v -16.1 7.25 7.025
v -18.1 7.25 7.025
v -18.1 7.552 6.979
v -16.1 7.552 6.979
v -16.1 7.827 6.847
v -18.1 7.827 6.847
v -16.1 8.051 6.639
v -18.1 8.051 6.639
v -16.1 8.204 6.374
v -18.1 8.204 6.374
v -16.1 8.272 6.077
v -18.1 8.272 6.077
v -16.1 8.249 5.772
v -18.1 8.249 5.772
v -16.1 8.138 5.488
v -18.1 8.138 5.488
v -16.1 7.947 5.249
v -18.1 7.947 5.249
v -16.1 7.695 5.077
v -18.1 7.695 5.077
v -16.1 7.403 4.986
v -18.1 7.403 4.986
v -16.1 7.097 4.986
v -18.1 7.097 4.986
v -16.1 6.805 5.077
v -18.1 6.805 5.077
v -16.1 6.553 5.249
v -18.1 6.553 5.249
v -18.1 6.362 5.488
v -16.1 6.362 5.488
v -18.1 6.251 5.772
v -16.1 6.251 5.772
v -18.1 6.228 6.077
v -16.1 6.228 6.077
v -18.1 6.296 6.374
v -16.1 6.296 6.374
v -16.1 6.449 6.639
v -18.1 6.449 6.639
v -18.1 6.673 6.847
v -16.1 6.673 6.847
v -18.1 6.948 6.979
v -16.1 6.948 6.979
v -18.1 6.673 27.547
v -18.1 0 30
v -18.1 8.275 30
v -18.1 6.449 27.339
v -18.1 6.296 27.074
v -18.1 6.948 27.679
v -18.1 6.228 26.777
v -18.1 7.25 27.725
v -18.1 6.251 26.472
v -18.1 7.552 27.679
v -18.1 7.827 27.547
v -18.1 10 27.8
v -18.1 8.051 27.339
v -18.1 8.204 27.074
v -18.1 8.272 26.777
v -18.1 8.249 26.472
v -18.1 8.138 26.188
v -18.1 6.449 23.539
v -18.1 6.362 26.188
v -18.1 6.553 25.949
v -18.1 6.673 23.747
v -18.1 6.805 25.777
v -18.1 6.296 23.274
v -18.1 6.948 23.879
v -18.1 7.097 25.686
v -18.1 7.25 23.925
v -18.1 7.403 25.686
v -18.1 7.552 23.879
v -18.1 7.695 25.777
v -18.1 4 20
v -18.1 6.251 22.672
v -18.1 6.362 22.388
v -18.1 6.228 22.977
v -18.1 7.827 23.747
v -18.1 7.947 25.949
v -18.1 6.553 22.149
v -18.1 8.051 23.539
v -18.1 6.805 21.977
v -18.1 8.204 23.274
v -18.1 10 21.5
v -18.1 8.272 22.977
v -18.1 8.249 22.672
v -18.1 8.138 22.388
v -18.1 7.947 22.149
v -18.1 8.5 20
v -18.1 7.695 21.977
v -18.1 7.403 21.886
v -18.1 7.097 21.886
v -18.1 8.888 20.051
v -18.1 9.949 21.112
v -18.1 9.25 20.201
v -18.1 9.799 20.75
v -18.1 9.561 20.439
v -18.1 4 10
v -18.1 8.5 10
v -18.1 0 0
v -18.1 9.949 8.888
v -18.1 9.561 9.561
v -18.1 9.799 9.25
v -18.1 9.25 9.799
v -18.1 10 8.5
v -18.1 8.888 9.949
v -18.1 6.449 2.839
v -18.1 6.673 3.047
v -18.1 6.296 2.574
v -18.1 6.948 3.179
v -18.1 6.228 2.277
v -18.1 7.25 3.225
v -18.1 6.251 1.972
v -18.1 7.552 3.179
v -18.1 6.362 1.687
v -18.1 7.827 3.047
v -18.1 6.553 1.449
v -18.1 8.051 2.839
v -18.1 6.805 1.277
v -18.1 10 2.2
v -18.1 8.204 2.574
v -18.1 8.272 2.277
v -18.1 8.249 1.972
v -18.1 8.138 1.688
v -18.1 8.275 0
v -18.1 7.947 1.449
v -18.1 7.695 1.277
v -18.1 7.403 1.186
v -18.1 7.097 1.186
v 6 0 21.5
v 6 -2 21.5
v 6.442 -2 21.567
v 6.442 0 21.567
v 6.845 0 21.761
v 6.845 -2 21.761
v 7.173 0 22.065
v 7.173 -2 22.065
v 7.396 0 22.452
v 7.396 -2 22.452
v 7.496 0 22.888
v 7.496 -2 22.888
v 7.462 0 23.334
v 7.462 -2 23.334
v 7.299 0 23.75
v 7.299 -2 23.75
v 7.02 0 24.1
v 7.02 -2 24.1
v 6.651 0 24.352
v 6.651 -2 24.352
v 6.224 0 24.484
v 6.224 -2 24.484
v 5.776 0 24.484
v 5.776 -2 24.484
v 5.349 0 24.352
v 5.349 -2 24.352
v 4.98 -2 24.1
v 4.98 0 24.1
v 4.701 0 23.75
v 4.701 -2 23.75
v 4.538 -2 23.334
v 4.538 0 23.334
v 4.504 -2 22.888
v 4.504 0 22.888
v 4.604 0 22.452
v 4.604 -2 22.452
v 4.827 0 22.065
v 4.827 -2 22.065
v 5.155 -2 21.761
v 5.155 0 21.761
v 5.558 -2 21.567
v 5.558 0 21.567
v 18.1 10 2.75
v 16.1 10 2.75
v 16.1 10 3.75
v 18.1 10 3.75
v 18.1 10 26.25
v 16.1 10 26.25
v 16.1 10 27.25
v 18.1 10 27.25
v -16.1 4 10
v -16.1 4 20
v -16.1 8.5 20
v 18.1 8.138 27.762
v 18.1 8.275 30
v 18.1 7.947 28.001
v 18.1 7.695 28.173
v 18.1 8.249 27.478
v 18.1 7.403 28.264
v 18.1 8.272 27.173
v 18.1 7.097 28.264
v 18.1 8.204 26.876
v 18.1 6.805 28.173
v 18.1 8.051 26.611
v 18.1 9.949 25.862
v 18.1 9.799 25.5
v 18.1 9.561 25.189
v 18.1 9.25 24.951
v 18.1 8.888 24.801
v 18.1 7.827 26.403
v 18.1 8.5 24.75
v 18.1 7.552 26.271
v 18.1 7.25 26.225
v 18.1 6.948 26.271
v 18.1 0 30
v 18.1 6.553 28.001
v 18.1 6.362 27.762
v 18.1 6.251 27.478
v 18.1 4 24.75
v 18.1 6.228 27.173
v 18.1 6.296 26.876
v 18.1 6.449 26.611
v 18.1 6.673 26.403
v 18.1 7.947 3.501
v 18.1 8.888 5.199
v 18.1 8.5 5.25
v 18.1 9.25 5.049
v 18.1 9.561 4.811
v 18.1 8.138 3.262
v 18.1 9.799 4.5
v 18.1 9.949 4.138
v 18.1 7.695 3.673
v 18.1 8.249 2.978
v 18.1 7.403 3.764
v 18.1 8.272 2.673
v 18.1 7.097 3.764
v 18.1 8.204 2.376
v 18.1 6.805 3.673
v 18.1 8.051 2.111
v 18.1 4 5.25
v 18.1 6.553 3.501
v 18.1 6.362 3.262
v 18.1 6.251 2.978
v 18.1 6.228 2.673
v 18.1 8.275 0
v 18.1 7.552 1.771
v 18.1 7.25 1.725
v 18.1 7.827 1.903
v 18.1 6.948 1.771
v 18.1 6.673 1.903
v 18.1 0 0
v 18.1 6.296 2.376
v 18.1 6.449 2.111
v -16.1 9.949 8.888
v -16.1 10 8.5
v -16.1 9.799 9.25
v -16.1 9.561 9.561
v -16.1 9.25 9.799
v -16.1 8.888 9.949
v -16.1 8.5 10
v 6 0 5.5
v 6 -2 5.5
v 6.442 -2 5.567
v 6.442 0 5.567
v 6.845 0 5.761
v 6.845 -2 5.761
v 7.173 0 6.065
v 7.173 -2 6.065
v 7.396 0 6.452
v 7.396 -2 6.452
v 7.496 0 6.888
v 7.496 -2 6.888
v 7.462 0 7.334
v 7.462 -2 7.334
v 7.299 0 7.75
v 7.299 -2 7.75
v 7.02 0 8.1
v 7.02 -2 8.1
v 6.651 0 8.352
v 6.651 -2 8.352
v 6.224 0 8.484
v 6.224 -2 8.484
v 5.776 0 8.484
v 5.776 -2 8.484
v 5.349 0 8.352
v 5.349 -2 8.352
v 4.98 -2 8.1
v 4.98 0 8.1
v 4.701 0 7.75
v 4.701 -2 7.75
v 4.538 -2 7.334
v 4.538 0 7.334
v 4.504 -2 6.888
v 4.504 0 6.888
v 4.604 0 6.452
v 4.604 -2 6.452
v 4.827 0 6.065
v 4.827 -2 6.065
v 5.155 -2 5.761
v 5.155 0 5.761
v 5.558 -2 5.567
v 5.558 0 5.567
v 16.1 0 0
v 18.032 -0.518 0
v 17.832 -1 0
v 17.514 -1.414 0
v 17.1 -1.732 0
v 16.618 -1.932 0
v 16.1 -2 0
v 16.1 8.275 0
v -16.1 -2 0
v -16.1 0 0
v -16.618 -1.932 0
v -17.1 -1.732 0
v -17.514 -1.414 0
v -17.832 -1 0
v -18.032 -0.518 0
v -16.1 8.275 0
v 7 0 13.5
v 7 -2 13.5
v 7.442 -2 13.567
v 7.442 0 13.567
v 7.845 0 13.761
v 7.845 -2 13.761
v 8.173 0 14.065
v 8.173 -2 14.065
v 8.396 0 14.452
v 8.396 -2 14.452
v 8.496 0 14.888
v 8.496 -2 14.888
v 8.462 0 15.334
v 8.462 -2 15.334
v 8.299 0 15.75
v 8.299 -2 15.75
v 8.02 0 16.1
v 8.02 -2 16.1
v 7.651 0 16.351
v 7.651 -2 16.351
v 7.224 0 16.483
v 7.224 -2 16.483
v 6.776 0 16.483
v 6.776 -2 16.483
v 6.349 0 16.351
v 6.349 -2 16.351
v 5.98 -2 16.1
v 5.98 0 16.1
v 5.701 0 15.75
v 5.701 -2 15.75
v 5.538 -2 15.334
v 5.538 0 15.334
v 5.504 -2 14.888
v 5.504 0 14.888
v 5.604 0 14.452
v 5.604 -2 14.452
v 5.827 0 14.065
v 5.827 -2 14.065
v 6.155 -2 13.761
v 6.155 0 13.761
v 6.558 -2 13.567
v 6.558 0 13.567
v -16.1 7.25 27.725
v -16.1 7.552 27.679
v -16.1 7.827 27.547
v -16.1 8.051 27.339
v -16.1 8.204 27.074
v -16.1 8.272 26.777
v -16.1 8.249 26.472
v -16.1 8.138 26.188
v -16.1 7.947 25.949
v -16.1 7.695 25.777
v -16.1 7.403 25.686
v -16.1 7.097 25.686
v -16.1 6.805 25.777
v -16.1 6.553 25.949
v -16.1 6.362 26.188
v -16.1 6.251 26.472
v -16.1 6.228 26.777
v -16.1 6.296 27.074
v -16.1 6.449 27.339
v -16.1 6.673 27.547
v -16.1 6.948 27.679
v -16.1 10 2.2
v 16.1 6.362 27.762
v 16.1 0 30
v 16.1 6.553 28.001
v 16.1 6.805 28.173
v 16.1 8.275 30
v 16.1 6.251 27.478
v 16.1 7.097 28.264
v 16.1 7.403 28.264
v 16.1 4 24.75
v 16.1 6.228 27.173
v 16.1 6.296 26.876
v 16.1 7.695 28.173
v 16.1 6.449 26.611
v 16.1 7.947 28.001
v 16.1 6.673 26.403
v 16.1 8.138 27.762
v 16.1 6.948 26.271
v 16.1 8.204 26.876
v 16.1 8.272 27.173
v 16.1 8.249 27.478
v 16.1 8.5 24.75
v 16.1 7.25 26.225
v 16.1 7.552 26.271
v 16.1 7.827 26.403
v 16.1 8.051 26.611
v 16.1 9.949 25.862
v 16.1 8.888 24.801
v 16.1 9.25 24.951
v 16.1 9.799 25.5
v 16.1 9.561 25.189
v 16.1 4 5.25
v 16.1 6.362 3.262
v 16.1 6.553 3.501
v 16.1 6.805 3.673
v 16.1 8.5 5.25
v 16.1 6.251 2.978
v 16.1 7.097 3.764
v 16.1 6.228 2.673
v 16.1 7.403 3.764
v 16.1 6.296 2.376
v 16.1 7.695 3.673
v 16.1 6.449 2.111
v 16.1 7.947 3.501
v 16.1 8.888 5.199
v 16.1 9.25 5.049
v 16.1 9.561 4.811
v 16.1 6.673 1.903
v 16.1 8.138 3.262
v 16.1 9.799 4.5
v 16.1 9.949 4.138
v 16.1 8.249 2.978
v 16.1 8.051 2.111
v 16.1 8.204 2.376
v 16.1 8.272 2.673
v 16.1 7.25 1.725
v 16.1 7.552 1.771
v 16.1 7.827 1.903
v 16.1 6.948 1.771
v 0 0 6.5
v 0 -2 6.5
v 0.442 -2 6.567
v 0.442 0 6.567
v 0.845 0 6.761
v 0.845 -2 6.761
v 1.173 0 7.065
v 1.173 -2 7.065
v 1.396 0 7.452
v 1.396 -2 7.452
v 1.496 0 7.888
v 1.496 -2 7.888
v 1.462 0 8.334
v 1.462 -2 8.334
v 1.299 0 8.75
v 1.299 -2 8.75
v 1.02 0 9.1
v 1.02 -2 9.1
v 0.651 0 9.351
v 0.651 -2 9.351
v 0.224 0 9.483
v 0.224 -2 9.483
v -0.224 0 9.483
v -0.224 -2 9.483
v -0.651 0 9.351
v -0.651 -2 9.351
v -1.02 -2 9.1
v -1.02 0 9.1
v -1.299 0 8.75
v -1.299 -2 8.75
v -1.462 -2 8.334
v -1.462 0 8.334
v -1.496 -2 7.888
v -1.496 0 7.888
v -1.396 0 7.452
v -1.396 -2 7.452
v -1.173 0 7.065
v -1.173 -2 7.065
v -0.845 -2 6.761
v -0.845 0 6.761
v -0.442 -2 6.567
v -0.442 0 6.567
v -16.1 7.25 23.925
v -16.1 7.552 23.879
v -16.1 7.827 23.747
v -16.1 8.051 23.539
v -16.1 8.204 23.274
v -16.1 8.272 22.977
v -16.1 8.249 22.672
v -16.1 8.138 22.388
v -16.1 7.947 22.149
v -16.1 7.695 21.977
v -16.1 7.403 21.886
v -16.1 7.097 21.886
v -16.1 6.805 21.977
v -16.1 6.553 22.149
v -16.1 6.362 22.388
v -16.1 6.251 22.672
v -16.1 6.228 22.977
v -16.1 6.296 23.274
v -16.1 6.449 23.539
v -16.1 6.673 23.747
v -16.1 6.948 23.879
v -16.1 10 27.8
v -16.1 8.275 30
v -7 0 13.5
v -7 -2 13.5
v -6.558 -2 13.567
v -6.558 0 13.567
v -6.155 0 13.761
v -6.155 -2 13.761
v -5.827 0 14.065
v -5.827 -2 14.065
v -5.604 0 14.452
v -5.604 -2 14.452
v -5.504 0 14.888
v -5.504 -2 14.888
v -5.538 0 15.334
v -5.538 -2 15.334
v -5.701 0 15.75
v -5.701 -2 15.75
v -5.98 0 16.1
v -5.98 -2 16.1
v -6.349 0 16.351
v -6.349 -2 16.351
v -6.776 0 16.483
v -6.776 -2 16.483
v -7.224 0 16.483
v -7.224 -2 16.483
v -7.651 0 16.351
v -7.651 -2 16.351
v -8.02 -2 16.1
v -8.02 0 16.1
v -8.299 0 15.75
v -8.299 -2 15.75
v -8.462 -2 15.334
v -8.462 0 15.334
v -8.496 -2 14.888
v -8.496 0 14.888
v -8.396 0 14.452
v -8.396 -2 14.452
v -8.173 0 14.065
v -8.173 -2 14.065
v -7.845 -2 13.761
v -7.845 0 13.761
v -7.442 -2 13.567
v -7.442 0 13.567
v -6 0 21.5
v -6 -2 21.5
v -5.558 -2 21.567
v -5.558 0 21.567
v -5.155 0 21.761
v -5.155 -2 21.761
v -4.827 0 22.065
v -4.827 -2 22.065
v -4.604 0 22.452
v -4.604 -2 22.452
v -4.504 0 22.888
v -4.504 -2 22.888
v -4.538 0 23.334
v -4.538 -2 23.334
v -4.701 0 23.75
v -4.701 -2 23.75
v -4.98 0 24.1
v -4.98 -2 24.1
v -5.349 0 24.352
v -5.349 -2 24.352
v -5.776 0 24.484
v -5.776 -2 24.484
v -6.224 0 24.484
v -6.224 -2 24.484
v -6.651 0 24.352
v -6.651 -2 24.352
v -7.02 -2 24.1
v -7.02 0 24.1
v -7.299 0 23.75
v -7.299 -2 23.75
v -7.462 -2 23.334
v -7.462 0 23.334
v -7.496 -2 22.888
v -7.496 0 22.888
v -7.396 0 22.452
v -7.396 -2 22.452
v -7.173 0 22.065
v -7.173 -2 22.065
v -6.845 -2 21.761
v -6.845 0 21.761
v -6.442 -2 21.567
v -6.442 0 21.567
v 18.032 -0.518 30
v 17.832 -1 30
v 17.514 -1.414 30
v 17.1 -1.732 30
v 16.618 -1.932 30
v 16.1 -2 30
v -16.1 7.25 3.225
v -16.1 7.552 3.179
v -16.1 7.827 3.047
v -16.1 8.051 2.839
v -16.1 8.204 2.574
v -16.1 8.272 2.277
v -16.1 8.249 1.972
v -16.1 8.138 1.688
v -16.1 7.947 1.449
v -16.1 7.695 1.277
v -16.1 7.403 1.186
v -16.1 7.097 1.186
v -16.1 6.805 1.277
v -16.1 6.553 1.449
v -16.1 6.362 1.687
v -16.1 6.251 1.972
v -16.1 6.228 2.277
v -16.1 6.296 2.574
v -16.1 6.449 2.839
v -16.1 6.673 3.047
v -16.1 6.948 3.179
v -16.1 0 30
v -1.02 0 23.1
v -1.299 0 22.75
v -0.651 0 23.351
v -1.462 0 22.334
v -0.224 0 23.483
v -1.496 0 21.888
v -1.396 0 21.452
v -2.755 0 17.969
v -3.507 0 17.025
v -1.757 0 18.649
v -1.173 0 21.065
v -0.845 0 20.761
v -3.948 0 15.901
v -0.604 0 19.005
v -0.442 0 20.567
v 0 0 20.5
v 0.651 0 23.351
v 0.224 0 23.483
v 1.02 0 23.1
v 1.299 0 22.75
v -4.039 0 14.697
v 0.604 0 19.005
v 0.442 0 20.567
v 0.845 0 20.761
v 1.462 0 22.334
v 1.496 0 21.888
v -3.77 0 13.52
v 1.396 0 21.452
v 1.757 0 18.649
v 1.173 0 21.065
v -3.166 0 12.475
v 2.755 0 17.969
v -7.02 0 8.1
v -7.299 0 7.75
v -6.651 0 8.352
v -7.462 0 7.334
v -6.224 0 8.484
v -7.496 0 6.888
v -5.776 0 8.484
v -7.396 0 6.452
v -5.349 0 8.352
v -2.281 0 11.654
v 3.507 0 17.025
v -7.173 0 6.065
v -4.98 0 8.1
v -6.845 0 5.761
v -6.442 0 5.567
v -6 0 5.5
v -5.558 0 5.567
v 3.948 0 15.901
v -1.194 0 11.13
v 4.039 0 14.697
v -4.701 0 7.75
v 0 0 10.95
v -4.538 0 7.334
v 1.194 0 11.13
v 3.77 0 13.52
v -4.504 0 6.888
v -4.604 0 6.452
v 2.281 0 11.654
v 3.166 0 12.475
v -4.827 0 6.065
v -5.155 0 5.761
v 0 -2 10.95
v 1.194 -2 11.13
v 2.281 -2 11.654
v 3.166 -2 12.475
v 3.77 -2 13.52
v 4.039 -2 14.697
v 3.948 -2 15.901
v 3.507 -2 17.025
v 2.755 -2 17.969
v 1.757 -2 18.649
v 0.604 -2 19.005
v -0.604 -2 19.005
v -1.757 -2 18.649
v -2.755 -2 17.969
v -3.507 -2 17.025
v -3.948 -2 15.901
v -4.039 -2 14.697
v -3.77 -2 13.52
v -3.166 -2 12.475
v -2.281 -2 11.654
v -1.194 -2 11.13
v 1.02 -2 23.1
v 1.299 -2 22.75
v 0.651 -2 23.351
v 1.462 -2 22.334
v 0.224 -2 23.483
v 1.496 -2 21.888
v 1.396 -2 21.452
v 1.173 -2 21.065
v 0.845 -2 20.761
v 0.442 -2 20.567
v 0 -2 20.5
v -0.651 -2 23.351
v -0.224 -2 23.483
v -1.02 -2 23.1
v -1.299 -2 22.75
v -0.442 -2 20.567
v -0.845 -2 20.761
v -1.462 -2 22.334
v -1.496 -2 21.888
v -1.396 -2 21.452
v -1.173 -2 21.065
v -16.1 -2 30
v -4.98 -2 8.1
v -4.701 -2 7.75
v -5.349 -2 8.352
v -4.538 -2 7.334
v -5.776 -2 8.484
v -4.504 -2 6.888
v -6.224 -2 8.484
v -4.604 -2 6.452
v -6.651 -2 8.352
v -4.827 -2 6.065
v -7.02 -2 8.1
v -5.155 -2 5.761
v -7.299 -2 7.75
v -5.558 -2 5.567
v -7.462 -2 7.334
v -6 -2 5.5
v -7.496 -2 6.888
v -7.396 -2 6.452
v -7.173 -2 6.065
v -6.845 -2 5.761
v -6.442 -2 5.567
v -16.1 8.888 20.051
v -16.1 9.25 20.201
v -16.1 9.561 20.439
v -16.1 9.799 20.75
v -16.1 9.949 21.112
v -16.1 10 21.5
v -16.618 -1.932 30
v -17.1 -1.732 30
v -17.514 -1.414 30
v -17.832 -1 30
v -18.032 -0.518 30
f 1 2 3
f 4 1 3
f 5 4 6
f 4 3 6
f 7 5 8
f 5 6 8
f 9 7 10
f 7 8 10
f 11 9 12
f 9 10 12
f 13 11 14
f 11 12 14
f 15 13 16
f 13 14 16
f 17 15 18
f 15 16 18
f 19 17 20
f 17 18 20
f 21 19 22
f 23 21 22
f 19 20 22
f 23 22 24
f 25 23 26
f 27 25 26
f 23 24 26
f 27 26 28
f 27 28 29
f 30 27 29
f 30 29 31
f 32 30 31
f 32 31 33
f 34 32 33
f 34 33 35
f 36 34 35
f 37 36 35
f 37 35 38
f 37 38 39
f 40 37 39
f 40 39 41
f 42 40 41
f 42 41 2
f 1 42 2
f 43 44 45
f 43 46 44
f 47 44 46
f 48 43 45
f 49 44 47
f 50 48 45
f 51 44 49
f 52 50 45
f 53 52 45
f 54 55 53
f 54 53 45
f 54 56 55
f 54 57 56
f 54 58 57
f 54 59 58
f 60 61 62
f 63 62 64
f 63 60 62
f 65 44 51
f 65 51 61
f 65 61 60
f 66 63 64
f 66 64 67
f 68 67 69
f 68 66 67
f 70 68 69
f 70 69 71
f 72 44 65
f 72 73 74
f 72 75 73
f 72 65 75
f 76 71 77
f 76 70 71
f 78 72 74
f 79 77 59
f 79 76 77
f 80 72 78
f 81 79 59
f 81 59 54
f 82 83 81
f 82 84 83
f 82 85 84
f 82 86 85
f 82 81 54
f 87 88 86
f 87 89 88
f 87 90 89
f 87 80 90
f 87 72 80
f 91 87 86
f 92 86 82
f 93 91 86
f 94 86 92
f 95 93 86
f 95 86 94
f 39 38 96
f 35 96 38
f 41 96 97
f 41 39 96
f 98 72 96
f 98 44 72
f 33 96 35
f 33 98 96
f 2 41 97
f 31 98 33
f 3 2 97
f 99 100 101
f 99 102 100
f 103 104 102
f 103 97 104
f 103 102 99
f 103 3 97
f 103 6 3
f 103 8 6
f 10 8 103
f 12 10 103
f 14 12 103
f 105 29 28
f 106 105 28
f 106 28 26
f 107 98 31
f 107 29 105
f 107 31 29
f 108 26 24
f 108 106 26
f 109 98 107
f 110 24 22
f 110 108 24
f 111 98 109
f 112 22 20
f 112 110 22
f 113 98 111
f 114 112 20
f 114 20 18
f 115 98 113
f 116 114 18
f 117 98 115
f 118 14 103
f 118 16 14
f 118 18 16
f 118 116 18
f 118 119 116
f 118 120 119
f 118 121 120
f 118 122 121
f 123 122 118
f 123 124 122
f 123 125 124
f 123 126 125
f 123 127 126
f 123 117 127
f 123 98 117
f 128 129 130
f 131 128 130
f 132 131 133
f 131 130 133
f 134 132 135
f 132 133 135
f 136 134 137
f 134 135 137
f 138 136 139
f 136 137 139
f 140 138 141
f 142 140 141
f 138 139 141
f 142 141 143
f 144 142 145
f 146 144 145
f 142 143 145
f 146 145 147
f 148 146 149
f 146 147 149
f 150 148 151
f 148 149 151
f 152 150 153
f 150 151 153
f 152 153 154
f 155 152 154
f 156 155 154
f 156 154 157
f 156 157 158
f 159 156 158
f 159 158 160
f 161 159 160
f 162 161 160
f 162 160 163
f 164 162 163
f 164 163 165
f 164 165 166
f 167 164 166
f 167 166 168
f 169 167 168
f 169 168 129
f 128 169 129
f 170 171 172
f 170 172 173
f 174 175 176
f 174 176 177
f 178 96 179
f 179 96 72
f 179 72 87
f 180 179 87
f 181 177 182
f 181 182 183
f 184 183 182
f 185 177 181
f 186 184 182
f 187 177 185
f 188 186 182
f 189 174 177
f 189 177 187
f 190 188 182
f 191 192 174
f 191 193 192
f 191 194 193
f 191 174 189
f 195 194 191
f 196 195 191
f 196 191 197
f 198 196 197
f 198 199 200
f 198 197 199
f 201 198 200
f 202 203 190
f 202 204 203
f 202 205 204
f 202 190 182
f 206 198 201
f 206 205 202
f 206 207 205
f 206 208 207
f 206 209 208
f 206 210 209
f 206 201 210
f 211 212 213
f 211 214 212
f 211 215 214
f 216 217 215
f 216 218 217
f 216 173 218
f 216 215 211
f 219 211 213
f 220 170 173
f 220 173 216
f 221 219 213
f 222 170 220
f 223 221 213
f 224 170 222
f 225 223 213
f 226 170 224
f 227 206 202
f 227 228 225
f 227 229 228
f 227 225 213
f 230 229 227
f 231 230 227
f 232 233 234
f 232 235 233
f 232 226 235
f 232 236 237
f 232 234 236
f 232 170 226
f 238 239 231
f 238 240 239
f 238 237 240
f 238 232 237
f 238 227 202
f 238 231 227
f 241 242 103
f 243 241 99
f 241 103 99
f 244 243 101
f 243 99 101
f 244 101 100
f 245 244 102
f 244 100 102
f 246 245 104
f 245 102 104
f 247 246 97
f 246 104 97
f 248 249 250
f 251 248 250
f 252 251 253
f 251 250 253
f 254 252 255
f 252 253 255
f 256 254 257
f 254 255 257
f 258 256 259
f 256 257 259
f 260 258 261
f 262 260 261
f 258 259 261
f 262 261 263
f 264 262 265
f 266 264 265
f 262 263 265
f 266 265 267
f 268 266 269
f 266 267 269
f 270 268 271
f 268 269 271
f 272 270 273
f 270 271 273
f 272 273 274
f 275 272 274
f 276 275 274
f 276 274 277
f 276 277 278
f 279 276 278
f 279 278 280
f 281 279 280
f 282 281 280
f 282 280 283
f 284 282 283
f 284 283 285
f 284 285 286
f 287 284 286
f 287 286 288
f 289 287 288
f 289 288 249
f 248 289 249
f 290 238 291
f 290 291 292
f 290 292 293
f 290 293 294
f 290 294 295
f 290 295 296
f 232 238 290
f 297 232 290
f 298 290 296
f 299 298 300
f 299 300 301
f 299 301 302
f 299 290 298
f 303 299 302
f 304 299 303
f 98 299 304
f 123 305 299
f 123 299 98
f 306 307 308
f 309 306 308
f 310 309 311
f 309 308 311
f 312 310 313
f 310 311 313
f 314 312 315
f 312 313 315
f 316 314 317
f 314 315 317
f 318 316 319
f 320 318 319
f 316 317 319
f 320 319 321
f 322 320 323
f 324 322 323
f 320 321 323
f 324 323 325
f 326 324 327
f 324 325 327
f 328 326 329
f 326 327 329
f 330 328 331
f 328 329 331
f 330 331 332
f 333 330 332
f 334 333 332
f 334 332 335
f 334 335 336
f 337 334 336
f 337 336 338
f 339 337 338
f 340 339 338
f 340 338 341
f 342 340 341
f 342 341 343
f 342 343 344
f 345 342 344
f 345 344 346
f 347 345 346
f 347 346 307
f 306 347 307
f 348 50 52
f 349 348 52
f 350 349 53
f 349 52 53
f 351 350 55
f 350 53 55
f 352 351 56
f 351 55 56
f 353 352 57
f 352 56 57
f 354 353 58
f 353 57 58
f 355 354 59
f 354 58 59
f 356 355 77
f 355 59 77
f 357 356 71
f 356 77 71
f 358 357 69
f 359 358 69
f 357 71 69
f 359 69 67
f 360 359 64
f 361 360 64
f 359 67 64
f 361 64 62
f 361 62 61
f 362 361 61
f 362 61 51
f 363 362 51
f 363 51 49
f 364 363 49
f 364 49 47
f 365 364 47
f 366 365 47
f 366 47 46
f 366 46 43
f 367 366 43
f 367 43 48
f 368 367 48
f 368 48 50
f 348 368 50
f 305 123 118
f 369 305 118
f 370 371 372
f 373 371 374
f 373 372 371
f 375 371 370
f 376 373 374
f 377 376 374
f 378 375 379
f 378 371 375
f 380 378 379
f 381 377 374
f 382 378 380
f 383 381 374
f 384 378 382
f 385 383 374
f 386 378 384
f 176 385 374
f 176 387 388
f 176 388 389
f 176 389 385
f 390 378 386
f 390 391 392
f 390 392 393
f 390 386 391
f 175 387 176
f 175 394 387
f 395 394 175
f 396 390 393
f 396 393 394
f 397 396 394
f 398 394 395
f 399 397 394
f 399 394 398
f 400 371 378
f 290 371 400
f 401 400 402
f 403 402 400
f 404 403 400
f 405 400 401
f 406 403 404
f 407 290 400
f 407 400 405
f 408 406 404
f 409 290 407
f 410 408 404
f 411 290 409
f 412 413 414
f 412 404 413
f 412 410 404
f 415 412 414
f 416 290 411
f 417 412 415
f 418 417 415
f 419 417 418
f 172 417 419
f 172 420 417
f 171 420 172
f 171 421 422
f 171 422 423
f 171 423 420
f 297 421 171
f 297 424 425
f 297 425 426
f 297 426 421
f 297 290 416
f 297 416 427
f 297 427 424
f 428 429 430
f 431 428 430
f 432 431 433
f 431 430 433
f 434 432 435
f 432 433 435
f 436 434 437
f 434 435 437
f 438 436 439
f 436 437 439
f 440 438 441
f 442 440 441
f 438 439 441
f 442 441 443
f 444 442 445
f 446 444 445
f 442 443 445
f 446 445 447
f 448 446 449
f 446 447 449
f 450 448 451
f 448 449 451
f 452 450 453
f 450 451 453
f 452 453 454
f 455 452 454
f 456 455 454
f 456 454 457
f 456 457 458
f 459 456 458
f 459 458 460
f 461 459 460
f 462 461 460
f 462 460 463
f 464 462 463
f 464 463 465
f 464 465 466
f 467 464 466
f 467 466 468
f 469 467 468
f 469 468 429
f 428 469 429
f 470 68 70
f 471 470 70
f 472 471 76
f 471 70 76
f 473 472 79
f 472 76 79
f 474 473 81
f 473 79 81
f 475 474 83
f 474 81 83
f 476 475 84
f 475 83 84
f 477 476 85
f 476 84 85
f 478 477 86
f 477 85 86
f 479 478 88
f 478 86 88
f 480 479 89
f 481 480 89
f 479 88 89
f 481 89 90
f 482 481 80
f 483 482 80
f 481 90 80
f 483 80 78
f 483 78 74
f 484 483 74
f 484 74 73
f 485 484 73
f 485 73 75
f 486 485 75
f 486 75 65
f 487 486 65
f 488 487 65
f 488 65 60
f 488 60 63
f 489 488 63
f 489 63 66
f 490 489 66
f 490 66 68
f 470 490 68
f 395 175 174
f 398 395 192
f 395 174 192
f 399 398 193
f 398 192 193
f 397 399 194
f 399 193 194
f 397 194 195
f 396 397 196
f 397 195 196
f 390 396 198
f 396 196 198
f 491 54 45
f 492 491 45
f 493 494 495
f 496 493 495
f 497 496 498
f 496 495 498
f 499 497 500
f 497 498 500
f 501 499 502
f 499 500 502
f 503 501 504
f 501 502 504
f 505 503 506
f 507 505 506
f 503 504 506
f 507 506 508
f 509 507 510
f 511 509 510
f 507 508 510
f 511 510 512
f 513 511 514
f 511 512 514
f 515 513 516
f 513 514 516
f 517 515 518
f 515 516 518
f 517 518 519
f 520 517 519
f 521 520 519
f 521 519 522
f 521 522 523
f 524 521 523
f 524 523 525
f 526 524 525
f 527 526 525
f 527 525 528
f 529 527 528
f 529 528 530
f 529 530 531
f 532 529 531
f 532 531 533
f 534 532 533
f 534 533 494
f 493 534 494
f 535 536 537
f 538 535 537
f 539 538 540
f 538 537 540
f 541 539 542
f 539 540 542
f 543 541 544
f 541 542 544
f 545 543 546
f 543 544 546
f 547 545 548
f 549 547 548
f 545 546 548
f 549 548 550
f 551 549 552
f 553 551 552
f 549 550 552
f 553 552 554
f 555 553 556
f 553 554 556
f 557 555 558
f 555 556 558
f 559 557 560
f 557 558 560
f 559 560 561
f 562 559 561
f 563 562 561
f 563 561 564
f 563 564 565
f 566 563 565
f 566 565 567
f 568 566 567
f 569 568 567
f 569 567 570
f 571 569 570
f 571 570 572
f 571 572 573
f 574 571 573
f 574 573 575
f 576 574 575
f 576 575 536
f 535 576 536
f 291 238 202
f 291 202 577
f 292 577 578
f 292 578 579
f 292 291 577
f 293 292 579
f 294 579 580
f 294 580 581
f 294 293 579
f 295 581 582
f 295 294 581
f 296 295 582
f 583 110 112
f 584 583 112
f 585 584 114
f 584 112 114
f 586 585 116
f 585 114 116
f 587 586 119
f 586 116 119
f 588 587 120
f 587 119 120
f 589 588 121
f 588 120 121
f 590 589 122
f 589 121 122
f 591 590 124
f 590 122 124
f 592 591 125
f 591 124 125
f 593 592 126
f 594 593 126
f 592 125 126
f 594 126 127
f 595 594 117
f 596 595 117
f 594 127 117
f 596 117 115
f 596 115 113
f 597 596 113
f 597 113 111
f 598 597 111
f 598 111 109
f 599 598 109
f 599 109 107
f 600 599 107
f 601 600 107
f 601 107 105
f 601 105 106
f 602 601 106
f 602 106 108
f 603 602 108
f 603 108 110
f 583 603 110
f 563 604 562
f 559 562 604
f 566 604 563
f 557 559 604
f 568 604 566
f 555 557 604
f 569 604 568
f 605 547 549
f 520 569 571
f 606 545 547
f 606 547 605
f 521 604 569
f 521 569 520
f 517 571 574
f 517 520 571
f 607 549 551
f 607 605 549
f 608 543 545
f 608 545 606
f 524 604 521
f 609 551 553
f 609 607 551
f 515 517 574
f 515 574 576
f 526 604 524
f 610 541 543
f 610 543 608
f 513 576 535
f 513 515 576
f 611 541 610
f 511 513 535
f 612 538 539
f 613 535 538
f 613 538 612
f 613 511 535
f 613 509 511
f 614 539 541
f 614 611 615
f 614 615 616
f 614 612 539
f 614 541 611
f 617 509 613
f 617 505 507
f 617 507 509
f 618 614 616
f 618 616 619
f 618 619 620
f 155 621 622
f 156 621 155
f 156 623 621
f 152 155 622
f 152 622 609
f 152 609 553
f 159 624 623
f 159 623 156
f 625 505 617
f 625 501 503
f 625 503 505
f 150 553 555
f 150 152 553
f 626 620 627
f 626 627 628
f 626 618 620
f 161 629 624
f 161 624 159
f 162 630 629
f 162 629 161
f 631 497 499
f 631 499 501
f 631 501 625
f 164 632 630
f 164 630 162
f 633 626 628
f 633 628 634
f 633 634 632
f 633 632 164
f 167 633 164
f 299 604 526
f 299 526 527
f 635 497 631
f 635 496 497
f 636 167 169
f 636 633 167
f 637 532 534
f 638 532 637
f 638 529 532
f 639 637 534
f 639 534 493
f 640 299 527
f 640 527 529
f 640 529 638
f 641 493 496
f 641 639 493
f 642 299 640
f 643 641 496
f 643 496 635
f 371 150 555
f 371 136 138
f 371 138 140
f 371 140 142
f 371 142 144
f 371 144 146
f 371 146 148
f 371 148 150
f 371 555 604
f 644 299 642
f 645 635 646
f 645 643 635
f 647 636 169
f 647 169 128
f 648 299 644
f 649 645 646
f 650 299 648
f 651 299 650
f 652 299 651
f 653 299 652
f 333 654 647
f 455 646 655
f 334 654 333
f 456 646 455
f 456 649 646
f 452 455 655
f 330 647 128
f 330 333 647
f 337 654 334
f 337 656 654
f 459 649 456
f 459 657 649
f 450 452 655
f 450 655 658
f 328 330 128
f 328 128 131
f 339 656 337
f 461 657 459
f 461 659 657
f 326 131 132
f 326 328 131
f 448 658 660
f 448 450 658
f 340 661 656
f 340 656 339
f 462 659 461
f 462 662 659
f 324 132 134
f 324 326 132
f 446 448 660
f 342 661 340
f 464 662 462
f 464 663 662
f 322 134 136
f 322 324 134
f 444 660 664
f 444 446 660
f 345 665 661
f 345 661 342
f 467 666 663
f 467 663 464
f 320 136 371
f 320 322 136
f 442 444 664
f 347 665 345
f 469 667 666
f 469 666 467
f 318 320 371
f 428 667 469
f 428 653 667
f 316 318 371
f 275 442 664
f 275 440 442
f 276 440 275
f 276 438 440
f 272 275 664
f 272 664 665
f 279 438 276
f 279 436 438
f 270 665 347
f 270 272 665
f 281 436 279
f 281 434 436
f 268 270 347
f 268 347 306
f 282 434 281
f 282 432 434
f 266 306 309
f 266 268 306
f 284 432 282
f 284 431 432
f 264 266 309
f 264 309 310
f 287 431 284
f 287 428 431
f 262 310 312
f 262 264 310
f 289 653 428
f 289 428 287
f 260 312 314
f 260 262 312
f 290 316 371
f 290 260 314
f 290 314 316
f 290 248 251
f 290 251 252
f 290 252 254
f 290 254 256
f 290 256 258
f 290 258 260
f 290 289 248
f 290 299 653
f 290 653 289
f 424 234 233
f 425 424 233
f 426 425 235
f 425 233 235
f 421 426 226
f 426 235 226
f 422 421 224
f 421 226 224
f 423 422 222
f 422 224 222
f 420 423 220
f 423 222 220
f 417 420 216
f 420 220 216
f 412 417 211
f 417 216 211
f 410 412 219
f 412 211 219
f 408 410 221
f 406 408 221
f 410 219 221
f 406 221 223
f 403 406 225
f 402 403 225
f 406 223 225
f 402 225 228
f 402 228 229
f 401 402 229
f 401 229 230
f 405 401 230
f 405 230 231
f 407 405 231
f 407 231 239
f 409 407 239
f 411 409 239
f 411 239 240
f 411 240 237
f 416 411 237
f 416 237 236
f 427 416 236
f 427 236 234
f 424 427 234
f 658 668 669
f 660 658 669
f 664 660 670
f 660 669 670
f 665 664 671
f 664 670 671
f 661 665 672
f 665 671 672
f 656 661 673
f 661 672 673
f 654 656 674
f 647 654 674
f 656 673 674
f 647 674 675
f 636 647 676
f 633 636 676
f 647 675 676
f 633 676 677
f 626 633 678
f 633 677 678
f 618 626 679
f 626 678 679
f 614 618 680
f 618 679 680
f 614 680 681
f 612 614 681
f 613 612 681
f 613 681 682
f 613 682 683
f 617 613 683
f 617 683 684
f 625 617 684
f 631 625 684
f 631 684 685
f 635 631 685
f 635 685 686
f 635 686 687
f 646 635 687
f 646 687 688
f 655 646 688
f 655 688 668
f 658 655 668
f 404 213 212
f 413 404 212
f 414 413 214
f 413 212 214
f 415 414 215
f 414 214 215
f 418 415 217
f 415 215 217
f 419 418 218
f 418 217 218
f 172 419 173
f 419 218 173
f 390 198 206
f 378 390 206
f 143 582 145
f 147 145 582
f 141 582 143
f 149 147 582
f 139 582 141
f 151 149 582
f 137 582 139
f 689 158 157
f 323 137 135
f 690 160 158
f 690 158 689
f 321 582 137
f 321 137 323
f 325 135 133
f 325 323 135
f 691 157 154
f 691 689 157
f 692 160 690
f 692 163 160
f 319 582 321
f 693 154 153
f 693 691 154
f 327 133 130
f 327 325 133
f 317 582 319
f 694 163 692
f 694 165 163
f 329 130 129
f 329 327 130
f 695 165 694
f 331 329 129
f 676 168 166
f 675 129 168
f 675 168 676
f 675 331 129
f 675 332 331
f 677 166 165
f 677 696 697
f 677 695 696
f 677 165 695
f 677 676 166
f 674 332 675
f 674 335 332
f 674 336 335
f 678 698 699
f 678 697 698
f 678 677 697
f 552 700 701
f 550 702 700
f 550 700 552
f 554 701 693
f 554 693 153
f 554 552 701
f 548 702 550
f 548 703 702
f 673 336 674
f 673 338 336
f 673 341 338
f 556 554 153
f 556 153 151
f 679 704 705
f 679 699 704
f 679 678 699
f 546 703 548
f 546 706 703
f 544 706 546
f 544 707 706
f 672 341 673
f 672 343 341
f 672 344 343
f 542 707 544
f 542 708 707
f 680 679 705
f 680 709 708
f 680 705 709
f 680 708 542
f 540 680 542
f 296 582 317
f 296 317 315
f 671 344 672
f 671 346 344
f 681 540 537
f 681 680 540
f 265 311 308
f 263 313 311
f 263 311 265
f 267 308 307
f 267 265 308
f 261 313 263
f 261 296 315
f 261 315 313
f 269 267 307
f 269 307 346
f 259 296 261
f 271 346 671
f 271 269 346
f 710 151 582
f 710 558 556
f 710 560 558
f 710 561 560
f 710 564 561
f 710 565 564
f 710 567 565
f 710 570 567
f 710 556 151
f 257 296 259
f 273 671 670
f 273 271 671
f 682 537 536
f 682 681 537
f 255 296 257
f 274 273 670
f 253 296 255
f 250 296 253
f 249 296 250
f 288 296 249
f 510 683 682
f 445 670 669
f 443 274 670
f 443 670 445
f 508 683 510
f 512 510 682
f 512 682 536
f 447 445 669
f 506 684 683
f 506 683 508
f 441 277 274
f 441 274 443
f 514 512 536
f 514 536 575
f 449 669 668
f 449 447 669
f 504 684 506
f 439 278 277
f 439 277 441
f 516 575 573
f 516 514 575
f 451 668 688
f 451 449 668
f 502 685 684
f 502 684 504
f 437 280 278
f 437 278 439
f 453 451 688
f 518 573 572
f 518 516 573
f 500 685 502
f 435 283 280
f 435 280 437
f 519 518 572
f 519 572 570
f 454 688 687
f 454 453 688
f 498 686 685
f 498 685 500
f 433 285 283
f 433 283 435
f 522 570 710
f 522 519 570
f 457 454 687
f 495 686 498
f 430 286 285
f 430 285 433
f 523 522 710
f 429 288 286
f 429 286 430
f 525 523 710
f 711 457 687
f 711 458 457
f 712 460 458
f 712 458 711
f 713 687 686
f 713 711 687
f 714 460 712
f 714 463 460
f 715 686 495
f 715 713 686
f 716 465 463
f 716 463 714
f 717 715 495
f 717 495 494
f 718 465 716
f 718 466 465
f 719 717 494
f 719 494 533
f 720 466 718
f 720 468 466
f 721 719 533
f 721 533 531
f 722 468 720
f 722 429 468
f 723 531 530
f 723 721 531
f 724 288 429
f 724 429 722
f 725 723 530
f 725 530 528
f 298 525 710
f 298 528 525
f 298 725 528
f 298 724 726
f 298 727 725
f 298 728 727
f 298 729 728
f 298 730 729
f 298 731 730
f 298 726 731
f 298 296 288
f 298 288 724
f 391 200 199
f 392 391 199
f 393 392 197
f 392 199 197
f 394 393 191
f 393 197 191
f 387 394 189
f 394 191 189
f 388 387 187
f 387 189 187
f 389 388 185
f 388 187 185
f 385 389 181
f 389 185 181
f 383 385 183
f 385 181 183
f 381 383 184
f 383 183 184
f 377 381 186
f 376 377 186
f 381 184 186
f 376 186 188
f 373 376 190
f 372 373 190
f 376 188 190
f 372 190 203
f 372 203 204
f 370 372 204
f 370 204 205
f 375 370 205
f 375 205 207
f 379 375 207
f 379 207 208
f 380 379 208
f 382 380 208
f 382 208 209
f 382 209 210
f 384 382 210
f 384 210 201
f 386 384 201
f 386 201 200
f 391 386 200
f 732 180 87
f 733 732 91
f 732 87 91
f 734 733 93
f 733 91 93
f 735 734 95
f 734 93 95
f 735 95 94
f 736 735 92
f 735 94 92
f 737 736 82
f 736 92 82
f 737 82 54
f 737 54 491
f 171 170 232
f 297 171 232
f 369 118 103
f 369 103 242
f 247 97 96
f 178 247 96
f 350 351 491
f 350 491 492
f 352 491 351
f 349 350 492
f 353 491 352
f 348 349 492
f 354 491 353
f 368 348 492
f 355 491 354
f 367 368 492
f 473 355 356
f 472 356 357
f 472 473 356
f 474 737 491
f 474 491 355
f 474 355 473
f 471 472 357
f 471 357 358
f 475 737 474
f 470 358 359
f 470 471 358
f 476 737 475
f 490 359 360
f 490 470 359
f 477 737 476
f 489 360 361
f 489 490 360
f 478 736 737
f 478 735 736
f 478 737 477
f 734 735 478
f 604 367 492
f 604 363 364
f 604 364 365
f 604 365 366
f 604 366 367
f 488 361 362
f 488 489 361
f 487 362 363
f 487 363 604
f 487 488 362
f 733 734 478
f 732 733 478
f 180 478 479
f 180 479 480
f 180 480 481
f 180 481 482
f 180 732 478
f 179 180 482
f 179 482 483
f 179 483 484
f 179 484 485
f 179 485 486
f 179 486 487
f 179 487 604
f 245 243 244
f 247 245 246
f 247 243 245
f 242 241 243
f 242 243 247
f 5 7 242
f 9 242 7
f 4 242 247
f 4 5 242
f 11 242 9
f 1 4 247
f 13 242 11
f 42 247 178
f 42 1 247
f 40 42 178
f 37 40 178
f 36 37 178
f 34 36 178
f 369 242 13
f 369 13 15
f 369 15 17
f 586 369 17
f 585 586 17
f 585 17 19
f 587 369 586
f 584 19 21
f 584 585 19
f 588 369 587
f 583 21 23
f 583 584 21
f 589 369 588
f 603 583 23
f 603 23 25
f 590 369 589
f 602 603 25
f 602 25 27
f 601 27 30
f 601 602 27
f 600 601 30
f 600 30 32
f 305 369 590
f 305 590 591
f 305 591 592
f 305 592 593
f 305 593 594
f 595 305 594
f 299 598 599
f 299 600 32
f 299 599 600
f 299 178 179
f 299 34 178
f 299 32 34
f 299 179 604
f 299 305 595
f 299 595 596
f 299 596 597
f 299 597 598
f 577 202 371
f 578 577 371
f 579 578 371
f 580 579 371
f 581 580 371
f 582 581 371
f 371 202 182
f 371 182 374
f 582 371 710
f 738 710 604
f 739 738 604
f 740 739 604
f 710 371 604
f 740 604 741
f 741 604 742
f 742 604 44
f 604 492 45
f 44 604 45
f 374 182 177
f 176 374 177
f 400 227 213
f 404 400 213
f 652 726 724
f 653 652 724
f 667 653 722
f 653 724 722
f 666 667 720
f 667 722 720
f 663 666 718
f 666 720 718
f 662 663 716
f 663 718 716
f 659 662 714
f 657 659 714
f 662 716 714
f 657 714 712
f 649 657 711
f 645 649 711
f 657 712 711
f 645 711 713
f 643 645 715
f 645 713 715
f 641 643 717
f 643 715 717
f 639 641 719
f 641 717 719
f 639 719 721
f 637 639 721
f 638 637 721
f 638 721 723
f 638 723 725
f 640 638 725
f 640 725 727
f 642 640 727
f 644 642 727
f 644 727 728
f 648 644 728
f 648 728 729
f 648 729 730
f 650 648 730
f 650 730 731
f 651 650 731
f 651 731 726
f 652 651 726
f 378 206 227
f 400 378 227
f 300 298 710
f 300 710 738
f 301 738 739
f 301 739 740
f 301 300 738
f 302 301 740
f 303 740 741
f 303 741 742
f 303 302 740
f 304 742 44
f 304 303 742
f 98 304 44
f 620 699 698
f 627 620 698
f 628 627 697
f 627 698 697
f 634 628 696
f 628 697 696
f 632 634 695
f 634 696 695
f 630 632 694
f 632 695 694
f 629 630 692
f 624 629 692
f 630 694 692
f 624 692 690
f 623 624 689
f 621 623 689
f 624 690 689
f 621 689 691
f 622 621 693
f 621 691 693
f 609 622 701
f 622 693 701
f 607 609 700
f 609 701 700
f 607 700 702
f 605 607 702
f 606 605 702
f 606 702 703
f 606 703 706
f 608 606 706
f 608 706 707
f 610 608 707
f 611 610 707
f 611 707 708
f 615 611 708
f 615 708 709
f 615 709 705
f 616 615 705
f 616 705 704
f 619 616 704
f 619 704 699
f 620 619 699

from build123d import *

# Parameters (mm, degrees)
EXTRUDE_1_DEPTH     = 30
SKETCH_2_R          = 1.025
CUT_EXTRUDE_1_DEPTH = 4
SKETCH_3_R          = 1.025
CUT_EXTRUDE_2_DEPTH = 4
SKETCH_4_R          = 4.05
SKETCH_4_R_2        = 1.5
CUT_EXTRUDE_3_DEPTH = 10


with BuildPart() as part:
    # 草图1 → 凸台-拉伸1 (new body)
    with BuildSketch(Plane.XY):
        with BuildLine():
            Line((-16.1, 0), (16.1, 0))
            Line((16.1, 0), (16.1, 10))
            Line((16.1, 10), (18.1, 10))
            Line((18.1, 10), (18.1, 0))
            ThreePointArc((18.1, 0), (17.514213562, -1.414213562), (16.1, -2))
            Line((16.1, -2), (-16.1, -2))
            ThreePointArc((-16.1, -2), (-17.514213562, -1.414213562), (-18.1, 0))
            Line((-18.1, 0), (-18.1, 10))
            Line((-18.1, 10), (-16.1, 10))
            Line((-16.1, 10), (-16.1, 0))
        make_face()
    extrude(amount=EXTRUDE_1_DEPTH)

    # 草图2 → 切除-拉伸1 (cut)
    with BuildSketch(Plane(origin=(18.1, 0, 0), x_dir=(0, 0, -1), z_dir=(1, 0, 0))):
        Polygon((-30, 8.275), (-27.25, 10), (-30, 10), align=None)
        with BuildLine():
            ThreePointArc((-5.25, 8.5), (-4.810660172, 9.560660172), (-3.75, 10))
            Line((-3.75, 10), (-26.25, 10))
            ThreePointArc((-26.25, 10), (-25.189339828, 9.560660172), (-24.75, 8.5))
            Line((-24.75, 8.5), (-24.75, 4))
            Line((-24.75, 4), (-5.25, 4))
            Line((-5.25, 4), (-5.25, 8.5))
        make_face()
        with Locations((-27.25, 7.25)):
            Circle(SKETCH_2_R)
        with Locations((-2.75, 7.25)):
            Circle(SKETCH_2_R)
        Polygon((0, 10), (-2.75, 10), (0, 8.275), align=None)
    extrude(amount=-CUT_EXTRUDE_1_DEPTH, mode=Mode.SUBTRACT)

    # 草图3 → 切除-拉伸2 (cut)
    with BuildSketch(Plane.ZY.offset(18.1)):
        Polygon((0, 8.275), (2.2, 10), (0, 10), align=None)
        with Locations((2.2, 7.25)):
            Circle(SKETCH_3_R)
        with Locations((6, 7.25)):
            Circle(SKETCH_3_R)
        with BuildLine():
            Line((10, 8.5), (10, 4))
            Line((10, 4), (20, 4))
            Line((20, 4), (20, 8.5))
            ThreePointArc((20, 8.5), (20.439339828, 9.560660172), (21.5, 10))
            Line((21.5, 10), (8.5, 10))
            ThreePointArc((8.5, 10), (9.560660172, 9.560660172), (10, 8.5))
        make_face()
        with Locations((22.9, 7.25)):
            Circle(SKETCH_3_R)
        with Locations((26.7, 7.25)):
            Circle(SKETCH_3_R)
        Polygon((30, 10), (27.8, 10), (30, 8.275), align=None)
    extrude(amount=-CUT_EXTRUDE_2_DEPTH, mode=Mode.SUBTRACT)

    # 草图4 → 切除-拉伸3 (cut)
    with BuildSketch(Plane.XZ.offset(2)):
        with Locations(Location((0, 15, 0), (0, 0, 270))):
            Circle(SKETCH_4_R)
        with Locations(Location((7, 15, 0), (0, 0, 270))):
            Circle(SKETCH_4_R_2)
        with Locations(Location((0, 8, 0), (0, 0, 270))):
            Circle(SKETCH_4_R_2)
        with Locations(Location((-7, 15, 0), (0, 0, 270))):
            Circle(SKETCH_4_R_2)
        with Locations(Location((0, 22, 0), (0, 0, 270))):
            Circle(SKETCH_4_R_2)
        with Locations(Location((-6, 23.000374583, 0), (0, 0, 270))):
            Circle(SKETCH_4_R_2)
        with Locations(Location((6, 23.000374583, 0), (0, 0, 270))):
            Circle(SKETCH_4_R_2)
        with Locations(Location((-6, 7.000374583, 0), (0, 0, 270))):
            Circle(SKETCH_4_R_2)
        with Locations(Location((6, 7.000374583, 0), (0, 0, 270))):
            Circle(SKETCH_4_R_2)
    extrude(amount=-CUT_EXTRUDE_3_DEPTH, mode=Mode.SUBTRACT)


solid = part.part
